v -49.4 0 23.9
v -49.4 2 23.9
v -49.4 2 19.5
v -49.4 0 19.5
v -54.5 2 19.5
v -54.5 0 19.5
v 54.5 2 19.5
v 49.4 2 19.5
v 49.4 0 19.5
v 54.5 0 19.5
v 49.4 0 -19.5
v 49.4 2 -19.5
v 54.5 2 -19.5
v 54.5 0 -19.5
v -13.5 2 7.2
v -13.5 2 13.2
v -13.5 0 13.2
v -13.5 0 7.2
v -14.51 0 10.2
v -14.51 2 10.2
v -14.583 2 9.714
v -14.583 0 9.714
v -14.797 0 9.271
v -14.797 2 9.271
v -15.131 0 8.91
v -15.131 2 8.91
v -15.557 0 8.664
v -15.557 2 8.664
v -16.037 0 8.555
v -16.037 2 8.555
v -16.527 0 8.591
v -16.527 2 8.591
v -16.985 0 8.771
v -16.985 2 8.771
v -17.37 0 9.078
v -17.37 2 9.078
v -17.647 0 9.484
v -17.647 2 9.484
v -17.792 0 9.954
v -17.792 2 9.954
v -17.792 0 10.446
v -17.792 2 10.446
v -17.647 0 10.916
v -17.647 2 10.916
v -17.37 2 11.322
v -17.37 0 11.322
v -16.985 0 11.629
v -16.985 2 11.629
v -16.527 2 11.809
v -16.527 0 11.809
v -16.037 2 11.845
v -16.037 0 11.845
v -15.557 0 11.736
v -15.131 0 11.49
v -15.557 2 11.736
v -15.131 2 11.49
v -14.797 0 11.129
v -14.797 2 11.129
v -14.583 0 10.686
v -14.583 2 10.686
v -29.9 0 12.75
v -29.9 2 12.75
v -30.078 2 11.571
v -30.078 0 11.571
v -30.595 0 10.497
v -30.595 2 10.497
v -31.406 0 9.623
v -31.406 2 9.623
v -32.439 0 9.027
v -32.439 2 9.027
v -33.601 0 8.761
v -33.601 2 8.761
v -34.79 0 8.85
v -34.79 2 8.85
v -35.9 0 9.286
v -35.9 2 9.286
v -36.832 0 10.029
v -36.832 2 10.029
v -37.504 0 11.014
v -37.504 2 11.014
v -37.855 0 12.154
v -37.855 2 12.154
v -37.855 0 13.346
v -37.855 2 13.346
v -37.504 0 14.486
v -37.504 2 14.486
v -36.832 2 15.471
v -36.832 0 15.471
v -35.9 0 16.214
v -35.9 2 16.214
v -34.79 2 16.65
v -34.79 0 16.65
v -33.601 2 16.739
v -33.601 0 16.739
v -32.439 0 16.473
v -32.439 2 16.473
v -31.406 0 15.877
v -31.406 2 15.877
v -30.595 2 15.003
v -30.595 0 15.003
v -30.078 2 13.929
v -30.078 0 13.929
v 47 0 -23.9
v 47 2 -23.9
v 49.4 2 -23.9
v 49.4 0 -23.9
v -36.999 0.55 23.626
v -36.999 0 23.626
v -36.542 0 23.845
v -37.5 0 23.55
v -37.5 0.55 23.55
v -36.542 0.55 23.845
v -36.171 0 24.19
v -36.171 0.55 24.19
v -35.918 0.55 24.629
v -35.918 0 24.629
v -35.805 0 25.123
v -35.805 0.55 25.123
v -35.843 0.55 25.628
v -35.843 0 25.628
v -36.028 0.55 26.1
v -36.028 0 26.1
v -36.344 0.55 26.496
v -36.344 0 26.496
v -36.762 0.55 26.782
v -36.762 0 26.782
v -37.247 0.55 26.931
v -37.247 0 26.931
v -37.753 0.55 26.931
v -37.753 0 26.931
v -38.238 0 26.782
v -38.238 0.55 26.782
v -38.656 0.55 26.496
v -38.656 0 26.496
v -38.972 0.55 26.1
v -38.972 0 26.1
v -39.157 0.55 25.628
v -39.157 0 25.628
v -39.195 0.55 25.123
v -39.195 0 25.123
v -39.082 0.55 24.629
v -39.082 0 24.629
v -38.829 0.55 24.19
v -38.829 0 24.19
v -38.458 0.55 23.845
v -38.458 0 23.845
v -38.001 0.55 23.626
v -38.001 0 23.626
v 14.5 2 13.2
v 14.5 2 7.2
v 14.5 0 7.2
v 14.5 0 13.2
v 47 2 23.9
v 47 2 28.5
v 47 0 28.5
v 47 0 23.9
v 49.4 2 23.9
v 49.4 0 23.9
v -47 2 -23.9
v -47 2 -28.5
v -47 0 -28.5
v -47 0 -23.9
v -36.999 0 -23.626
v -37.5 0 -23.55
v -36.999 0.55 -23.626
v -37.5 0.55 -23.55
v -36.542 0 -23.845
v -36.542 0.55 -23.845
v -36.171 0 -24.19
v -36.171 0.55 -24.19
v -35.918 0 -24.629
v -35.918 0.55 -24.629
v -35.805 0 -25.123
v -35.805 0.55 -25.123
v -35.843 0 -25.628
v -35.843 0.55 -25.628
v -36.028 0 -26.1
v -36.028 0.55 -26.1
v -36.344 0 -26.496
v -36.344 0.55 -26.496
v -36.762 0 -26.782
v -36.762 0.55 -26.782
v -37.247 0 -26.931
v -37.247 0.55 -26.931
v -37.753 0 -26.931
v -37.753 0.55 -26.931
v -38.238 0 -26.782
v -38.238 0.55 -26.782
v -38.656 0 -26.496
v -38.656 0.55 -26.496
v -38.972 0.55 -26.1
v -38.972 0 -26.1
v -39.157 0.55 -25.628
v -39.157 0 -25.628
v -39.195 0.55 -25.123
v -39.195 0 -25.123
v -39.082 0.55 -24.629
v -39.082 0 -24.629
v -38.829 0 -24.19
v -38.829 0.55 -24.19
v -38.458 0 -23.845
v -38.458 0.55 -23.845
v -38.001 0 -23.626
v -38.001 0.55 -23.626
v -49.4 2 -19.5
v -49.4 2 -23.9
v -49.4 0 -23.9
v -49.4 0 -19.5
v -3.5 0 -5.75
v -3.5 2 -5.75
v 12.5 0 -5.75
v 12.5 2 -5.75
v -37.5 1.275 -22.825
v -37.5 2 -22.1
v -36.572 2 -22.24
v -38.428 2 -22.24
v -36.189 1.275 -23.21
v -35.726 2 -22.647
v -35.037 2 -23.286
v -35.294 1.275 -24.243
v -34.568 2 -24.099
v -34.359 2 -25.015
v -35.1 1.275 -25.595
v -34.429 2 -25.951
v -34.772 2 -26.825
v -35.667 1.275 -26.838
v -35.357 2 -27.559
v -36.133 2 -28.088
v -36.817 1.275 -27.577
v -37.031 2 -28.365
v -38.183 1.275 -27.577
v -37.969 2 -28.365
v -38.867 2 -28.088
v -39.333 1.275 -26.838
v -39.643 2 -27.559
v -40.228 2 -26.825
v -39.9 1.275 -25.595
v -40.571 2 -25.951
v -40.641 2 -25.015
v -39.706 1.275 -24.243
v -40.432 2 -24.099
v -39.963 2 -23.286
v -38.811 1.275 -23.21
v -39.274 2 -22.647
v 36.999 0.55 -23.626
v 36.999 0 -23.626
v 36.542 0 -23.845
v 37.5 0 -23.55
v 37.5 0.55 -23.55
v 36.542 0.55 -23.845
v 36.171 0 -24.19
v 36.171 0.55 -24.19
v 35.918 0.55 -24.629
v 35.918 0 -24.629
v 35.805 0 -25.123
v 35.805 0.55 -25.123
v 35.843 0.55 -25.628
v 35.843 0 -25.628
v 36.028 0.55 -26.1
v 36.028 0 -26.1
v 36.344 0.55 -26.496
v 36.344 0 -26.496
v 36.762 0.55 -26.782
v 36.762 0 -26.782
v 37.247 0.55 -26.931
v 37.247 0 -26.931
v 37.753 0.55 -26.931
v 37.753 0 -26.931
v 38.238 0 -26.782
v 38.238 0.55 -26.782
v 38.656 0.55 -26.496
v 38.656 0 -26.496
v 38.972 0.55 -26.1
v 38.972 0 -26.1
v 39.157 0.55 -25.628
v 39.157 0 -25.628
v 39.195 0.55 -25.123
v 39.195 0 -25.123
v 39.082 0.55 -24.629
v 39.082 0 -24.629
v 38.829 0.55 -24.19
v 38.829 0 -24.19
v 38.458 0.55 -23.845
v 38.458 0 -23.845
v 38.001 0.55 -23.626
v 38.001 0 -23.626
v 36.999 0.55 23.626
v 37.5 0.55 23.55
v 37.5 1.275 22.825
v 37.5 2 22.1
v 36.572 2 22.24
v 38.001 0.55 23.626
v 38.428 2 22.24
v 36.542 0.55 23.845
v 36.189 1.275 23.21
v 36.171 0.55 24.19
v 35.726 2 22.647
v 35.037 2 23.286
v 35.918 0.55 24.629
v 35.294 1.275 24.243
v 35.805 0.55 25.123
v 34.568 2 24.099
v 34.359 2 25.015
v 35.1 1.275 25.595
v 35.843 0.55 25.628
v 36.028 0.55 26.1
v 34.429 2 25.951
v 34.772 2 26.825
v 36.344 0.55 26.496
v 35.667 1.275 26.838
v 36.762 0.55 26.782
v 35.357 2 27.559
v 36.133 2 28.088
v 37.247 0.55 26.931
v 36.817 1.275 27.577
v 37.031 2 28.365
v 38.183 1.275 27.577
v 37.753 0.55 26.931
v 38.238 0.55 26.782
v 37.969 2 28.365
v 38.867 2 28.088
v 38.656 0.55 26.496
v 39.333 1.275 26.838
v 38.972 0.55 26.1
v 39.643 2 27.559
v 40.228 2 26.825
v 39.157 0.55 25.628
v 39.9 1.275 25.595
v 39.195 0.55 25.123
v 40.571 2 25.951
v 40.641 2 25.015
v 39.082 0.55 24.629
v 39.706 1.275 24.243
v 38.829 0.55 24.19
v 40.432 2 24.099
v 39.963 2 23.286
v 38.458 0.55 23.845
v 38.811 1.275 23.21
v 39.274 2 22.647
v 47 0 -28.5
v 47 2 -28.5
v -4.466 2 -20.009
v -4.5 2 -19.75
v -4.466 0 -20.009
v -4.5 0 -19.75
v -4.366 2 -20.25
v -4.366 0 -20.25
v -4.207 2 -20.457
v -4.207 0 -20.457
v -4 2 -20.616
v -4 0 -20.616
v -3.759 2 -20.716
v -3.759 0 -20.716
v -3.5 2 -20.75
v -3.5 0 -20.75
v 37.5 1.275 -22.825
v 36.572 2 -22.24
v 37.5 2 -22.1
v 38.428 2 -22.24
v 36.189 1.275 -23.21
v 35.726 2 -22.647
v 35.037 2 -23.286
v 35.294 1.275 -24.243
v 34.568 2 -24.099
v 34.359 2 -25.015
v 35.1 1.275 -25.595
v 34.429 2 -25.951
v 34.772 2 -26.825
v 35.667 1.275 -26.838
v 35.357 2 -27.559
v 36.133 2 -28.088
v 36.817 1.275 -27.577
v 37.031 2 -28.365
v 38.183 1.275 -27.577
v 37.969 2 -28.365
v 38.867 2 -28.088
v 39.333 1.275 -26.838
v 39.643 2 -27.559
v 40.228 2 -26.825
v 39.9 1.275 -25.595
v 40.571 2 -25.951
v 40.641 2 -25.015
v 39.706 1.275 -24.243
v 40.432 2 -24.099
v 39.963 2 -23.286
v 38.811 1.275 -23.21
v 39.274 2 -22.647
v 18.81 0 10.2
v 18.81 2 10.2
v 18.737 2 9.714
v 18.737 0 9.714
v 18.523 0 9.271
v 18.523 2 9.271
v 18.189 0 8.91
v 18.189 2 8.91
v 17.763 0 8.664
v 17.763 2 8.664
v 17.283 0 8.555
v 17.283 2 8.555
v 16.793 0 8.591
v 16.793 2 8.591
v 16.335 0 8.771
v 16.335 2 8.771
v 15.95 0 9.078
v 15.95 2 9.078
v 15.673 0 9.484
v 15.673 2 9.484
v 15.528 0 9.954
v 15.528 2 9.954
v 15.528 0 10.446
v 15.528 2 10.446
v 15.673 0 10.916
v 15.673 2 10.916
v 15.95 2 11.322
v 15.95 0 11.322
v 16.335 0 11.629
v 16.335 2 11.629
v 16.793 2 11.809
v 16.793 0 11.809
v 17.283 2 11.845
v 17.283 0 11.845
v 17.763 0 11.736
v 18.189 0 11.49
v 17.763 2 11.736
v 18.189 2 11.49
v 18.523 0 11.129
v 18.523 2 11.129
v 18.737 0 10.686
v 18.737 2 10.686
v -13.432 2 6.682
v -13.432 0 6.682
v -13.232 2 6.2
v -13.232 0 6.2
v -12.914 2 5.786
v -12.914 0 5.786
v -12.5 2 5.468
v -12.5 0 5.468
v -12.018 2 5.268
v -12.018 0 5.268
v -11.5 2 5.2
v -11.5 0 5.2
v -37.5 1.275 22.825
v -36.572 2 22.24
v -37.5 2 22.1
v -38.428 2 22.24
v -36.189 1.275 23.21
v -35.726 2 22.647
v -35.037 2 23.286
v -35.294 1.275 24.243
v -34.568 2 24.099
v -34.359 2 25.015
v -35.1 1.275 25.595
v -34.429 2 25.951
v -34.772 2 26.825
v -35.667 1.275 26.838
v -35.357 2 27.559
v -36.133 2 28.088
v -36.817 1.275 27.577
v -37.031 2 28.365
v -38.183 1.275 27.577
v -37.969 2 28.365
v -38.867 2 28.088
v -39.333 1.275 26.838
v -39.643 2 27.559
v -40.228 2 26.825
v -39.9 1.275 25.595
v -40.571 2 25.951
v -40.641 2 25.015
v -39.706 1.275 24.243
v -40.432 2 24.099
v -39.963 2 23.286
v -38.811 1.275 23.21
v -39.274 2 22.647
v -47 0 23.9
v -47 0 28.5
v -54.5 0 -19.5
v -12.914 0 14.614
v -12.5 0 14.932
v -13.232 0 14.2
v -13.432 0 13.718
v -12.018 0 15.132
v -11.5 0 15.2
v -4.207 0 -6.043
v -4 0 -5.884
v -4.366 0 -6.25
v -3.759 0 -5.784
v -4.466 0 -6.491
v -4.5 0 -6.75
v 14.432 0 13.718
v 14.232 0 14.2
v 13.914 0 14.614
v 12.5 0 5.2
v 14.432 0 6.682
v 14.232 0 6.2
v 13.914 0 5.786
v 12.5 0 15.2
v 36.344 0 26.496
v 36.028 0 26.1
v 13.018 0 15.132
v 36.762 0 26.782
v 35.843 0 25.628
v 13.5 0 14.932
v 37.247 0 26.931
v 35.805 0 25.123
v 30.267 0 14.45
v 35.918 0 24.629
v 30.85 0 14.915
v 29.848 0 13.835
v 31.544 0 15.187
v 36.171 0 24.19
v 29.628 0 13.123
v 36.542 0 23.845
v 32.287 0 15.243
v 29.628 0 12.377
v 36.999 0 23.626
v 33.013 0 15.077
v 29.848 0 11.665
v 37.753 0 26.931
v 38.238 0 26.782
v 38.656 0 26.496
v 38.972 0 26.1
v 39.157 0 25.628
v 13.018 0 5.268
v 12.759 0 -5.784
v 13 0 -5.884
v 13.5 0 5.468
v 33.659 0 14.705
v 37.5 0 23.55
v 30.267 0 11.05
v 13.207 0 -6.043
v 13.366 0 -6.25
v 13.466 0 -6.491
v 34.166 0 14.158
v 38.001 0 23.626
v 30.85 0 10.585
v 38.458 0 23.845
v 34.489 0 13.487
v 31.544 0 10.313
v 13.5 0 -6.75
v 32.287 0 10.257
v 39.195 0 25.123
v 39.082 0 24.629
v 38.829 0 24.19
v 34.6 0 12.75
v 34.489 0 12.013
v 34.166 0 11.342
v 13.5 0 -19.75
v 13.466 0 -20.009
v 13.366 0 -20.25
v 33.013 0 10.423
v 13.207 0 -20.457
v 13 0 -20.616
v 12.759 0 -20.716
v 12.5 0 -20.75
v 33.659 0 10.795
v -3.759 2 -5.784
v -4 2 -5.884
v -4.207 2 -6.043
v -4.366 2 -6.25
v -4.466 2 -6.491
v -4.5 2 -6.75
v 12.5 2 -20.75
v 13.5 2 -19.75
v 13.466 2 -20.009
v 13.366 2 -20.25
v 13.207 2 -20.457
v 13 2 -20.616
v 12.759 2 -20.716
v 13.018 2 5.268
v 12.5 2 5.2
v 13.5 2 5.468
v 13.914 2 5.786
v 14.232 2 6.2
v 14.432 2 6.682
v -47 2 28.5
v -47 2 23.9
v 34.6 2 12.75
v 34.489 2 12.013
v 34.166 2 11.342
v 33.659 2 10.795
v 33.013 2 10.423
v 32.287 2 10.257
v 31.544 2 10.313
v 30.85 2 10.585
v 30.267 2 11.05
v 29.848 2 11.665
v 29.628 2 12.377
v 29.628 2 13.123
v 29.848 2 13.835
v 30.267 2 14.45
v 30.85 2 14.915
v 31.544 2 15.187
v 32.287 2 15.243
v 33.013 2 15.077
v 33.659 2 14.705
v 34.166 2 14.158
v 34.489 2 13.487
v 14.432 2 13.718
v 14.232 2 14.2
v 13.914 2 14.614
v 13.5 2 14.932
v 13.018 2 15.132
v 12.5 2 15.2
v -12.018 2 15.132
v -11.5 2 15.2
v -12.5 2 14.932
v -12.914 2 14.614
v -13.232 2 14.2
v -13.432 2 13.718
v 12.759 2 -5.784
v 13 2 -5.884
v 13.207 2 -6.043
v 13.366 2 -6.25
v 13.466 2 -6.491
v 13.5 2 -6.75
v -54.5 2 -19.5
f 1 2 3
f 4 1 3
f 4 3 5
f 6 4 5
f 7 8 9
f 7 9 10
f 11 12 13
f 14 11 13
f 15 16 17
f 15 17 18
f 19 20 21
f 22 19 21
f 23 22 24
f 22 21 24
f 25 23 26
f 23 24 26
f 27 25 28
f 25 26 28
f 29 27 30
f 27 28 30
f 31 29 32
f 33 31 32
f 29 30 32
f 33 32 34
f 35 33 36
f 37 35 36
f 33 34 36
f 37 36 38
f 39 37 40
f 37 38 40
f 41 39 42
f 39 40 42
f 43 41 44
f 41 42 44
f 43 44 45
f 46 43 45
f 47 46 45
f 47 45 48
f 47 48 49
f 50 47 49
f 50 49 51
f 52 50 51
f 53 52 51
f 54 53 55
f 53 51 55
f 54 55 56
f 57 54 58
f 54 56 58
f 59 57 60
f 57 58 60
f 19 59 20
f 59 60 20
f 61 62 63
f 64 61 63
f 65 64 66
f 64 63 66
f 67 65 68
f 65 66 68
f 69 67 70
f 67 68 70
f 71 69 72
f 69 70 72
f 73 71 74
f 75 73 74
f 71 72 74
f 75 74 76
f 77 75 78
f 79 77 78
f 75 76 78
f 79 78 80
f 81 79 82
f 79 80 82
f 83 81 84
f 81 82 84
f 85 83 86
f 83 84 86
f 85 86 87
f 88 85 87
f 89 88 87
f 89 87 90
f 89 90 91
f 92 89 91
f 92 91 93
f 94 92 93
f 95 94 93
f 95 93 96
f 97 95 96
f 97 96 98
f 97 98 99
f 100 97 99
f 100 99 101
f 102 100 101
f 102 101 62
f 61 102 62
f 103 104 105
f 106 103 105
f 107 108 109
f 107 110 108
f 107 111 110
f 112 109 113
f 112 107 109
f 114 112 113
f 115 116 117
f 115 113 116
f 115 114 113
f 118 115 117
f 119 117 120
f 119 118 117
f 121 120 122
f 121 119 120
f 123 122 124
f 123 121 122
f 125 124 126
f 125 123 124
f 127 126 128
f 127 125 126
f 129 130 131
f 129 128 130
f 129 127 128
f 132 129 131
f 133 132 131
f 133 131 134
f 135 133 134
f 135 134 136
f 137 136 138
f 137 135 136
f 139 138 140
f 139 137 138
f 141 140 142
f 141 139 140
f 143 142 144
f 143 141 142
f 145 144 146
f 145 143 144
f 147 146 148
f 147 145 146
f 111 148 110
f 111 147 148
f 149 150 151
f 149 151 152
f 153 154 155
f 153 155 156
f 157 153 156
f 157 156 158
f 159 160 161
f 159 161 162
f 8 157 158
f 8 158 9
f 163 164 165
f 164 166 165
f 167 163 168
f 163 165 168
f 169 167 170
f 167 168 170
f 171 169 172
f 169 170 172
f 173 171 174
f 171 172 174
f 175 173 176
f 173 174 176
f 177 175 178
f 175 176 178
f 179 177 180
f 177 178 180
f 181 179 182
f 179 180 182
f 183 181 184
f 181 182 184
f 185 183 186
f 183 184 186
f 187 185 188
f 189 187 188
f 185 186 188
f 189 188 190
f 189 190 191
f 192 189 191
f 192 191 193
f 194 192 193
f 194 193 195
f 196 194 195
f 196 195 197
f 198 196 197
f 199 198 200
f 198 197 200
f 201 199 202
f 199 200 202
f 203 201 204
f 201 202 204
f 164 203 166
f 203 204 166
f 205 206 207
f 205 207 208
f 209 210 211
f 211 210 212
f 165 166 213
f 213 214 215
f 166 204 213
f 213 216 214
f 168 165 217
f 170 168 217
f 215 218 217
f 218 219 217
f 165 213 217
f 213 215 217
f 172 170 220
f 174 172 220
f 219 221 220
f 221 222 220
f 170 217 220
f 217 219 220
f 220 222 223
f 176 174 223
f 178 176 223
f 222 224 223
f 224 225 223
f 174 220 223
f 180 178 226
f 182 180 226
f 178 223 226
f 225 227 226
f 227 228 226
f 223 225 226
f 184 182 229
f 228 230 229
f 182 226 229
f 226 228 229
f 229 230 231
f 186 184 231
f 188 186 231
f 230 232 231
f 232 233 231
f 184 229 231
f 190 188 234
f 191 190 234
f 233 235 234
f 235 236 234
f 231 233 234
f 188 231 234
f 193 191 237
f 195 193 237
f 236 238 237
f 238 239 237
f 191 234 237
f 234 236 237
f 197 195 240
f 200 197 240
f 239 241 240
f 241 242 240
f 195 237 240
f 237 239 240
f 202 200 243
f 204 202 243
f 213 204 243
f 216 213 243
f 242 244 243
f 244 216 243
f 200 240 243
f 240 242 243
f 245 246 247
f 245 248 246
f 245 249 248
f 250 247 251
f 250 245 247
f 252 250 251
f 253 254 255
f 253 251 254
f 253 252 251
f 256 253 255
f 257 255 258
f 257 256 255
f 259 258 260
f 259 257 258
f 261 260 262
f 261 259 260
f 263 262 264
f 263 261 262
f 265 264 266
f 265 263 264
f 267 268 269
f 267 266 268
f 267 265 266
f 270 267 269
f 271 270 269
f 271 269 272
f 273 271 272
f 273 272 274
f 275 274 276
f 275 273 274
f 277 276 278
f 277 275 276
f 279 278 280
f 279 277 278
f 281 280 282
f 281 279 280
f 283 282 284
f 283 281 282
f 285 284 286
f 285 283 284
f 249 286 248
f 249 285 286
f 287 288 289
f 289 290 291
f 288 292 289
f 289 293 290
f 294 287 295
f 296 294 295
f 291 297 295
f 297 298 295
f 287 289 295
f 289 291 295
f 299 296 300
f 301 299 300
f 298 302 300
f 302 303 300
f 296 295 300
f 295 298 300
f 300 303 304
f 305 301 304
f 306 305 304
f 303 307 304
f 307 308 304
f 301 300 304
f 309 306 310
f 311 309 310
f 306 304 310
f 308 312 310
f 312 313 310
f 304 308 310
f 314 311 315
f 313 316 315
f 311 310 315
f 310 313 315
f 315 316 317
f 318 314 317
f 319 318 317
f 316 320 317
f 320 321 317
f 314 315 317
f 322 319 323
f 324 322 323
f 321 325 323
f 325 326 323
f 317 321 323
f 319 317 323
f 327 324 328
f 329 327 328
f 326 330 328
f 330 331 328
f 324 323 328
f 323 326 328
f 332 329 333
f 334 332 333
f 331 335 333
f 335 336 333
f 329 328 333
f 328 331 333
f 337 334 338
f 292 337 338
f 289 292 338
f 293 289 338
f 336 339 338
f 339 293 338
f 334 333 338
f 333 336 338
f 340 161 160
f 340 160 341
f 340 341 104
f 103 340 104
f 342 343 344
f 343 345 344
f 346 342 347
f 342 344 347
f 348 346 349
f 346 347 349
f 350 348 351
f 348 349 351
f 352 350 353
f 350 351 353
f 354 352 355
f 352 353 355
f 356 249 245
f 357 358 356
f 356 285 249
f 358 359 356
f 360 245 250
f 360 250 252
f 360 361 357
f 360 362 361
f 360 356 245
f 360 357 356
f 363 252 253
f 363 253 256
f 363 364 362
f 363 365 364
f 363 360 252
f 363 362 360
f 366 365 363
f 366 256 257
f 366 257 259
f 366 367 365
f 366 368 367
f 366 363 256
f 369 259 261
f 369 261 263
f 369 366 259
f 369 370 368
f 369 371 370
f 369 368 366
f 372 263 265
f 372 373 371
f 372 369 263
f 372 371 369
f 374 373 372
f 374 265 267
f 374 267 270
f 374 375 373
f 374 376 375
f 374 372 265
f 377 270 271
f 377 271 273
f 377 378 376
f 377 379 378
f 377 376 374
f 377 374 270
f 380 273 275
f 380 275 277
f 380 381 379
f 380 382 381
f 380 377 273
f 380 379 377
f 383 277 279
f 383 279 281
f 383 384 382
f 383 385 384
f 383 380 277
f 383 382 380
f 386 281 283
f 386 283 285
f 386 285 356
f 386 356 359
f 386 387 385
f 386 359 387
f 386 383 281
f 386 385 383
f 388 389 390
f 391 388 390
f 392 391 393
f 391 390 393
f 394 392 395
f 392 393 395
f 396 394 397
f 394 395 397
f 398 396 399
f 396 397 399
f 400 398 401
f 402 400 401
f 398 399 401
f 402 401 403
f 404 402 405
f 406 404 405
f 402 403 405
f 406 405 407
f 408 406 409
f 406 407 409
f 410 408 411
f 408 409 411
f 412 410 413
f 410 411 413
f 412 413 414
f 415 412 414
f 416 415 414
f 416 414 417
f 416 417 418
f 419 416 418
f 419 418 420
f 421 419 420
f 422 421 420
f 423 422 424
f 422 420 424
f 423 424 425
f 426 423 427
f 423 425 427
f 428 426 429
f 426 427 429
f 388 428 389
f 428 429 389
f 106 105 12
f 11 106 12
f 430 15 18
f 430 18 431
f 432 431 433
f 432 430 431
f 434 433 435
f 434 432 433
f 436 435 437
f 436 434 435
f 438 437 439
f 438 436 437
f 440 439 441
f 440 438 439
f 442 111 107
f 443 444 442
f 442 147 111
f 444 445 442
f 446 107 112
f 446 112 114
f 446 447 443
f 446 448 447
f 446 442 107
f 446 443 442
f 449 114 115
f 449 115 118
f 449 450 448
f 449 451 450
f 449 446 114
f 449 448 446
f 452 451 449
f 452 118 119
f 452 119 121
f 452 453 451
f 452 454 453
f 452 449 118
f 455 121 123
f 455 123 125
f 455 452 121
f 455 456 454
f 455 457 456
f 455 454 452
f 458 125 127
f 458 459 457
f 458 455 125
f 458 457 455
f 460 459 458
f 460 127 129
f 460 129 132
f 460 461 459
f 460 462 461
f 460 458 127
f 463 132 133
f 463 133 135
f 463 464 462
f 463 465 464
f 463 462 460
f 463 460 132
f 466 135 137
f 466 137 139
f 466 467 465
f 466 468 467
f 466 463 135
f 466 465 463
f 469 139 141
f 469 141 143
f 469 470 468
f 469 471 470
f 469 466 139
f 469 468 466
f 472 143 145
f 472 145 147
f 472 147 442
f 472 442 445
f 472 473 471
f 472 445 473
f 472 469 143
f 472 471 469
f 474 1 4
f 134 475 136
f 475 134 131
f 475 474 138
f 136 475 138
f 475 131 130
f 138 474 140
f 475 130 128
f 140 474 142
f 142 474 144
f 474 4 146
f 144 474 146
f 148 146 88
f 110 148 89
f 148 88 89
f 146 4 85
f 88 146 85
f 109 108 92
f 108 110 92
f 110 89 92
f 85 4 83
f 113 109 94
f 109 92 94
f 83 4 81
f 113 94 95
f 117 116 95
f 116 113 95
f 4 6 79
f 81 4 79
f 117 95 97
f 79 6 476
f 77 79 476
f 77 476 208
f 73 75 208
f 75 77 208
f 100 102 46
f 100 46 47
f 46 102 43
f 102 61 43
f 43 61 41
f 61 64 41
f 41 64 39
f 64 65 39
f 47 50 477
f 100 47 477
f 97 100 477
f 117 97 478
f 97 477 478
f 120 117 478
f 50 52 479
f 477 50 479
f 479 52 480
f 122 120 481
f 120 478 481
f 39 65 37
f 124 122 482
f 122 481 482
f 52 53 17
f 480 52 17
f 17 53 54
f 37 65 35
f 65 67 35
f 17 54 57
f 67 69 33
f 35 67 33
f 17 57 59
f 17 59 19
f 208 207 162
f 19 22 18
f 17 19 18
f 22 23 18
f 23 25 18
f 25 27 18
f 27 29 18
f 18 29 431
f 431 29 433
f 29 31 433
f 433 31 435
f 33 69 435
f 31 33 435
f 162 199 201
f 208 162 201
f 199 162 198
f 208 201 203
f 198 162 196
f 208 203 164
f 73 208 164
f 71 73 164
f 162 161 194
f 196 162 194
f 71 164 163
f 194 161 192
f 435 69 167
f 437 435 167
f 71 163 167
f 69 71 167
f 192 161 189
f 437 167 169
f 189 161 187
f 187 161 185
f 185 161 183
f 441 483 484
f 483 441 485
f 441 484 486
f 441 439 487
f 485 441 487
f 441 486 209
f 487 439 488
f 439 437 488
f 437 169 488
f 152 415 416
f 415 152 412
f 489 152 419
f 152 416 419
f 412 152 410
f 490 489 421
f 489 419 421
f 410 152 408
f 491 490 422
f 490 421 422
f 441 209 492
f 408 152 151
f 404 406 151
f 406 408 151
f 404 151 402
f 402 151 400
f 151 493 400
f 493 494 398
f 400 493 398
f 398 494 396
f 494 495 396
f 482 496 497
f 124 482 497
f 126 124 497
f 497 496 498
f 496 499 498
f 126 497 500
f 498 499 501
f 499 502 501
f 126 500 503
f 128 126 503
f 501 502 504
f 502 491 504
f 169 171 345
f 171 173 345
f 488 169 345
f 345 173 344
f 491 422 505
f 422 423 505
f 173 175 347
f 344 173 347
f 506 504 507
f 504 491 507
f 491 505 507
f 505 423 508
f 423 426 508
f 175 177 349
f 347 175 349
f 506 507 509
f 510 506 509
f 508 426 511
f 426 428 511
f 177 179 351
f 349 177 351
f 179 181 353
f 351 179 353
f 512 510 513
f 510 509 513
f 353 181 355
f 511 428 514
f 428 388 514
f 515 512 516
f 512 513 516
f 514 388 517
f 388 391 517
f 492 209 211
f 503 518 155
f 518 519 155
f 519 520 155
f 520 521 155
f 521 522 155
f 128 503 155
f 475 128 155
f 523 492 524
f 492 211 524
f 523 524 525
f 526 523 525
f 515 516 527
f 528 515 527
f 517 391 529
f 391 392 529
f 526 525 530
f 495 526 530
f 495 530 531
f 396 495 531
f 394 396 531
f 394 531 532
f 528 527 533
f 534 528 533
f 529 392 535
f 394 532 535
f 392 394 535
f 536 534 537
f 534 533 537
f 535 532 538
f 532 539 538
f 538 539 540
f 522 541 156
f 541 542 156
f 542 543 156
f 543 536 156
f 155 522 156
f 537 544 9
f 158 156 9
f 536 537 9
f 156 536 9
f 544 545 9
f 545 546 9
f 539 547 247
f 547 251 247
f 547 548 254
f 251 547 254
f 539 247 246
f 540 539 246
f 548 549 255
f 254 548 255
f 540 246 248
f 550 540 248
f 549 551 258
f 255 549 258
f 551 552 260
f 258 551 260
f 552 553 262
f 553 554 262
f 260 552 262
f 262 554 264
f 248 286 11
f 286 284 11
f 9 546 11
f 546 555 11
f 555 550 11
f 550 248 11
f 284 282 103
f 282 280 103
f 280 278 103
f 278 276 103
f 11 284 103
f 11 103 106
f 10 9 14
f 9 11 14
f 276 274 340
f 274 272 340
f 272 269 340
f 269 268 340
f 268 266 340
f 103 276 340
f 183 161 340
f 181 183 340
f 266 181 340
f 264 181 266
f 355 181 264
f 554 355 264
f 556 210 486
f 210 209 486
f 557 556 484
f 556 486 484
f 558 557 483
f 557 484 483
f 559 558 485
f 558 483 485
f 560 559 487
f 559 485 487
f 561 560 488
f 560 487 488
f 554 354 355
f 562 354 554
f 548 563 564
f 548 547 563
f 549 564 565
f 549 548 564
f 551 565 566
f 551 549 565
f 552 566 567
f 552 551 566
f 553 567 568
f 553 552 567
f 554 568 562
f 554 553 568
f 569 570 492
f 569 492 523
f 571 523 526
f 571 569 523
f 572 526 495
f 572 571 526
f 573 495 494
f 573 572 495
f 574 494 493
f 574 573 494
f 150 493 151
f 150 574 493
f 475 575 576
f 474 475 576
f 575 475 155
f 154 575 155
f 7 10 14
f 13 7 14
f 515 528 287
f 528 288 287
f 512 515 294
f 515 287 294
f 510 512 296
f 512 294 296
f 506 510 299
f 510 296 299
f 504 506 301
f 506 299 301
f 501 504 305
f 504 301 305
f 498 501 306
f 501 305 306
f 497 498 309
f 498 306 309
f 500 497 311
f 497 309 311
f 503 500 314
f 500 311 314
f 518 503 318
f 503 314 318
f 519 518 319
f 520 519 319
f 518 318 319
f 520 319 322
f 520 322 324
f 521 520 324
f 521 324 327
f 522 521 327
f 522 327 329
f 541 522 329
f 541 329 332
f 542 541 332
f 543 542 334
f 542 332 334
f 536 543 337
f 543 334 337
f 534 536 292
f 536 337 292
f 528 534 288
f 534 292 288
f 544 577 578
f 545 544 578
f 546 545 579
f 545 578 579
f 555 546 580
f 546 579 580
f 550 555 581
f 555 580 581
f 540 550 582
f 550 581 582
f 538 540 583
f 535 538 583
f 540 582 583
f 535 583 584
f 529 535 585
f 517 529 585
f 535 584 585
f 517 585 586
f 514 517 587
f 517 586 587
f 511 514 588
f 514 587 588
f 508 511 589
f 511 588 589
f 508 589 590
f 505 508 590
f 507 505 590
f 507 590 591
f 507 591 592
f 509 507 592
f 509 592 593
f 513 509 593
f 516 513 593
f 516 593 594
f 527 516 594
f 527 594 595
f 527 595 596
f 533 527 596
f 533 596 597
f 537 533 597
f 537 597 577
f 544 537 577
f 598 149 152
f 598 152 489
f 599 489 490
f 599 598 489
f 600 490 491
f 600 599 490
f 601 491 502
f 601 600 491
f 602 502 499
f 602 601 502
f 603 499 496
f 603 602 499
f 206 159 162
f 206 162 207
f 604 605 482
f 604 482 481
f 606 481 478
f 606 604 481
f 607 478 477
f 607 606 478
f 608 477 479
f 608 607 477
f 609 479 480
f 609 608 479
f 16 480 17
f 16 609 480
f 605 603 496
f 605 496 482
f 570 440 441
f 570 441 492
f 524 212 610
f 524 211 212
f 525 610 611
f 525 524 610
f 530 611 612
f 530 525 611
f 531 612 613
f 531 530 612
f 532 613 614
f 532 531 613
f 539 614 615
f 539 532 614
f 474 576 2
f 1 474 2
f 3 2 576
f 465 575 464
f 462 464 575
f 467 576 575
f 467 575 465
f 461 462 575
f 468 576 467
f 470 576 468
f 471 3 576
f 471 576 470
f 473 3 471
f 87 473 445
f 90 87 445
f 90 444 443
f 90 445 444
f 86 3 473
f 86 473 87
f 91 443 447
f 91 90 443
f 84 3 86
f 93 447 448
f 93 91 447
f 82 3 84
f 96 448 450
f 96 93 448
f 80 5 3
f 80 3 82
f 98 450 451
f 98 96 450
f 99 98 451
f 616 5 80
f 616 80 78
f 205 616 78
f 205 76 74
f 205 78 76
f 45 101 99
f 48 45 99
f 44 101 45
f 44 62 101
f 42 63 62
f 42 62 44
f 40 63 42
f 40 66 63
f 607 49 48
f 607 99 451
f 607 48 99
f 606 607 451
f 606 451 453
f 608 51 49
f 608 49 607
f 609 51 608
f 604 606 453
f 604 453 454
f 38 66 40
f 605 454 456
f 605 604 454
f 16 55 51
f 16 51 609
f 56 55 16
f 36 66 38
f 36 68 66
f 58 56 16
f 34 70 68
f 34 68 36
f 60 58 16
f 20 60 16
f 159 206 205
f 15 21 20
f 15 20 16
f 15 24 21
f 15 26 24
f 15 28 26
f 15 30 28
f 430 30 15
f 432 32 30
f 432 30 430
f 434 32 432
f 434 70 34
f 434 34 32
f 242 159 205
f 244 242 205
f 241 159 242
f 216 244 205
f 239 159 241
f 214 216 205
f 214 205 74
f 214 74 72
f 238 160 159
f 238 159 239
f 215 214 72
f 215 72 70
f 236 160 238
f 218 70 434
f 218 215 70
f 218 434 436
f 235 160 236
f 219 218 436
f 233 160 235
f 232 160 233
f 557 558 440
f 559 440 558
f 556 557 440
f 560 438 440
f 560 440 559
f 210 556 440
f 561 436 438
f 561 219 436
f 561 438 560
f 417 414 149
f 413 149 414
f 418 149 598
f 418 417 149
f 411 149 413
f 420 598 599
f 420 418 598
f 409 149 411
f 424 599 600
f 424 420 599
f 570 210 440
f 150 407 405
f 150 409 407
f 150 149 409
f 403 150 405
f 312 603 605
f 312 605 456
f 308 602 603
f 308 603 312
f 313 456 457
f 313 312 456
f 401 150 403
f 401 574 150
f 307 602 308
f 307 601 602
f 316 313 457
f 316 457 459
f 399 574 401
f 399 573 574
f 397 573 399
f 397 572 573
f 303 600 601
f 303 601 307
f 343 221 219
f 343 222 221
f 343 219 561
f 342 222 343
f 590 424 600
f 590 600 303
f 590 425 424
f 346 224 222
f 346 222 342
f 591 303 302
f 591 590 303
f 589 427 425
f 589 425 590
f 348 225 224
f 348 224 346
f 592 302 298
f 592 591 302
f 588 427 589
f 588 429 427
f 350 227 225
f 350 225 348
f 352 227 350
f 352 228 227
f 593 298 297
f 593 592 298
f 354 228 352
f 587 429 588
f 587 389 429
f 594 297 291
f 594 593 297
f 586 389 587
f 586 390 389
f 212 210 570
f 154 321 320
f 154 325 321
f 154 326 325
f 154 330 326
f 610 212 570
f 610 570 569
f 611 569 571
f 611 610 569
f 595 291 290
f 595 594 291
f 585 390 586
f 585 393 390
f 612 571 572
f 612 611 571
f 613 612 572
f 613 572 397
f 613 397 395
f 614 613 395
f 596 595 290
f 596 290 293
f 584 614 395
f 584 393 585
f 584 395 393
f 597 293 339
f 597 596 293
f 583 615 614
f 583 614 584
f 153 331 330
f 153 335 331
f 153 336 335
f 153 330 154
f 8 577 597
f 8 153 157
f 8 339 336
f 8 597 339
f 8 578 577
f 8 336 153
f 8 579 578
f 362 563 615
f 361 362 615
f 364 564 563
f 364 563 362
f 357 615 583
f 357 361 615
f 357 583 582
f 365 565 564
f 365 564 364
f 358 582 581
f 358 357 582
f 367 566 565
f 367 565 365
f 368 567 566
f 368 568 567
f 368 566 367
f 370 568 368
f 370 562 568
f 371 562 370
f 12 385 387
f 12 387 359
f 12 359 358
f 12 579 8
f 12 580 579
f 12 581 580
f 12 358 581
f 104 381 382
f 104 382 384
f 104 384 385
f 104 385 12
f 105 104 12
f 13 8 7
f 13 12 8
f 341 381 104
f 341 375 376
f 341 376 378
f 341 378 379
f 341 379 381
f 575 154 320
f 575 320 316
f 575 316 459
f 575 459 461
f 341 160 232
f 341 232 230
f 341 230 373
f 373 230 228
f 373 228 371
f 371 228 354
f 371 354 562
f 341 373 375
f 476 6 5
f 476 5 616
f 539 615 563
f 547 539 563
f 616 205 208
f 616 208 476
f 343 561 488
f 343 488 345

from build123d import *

# Parameters (mm, degrees)
SKETCH_1_W            = 109
SKETCH_1_H            = 57
EXTRUDE_1_DEPTH       = 2
CUT_EXTRUDE_1_DEPTH   = 3
MIRROR_2_COPY_1_DEPTH = 3
SKETCH_3_R            = 4
SKETCH_3_R_2          = 2.5
CUT_EXTRUDE_2_DEPTH   = 3
SKETCH_4_R            = 1.65
CUT_EXTRUDE_3_DEPTH   = 2
SKETCH_5_W            = 18
SKETCH_5_H            = 15
CUT_EXTRUDE_4_DEPTH   = 3
FILLET_1_R            = 1


with BuildPart() as part:
    # Эскиз1 → Бобышка-Вытянуть1 (new body)
    with BuildSketch(Plane(origin=(0, 0, 0), x_dir=(1, 0, 0), z_dir=(0, 1, 0))):
        Rectangle(SKETCH_1_W, SKETCH_1_H)
    extrude(amount=EXTRUDE_1_DEPTH)

    # Эскиз2 → Вырез-Вытянуть1 (cut, through all)
    with BuildSketch(Plane(origin=(0, 2, 0), x_dir=(1, 0, 0), z_dir=(0, 1, 0))):
        Polygon((49.4, 19.5), (54.5, 19.5), (54.5, 28.5), (47, 28.5), (47, 23.9), (49.4, 23.9), align=None)
    cut_extrude_1 = extrude(amount=-CUT_EXTRUDE_1_DEPTH, mode=Mode.SUBTRACT)

    # Зеркальное отражение1: Вырез-Вытянуть1 across plane
    add(cut_extrude_1.mirror(Plane(origin=(0, 0, 0), x_dir=(0, 0, 1), z_dir=(1, 0, 0))), mode=Mode.SUBTRACT)

    # Зеркальное отражение2: Вырез-Вытянуть1 across plane
    add(cut_extrude_1.mirror(Plane.XY), mode=Mode.SUBTRACT)

    # Зеркальное отражение2 copy 1 sketch → Зеркальное отражение2 copy 1 (cut, through all)
    with BuildSketch(Plane(origin=(0, 2, 0), x_dir=(-1, 0, 0), z_dir=(0, 1, 0))):
        Polygon((49.4, 19.5), (54.5, 19.5), (54.5, 28.5), (47, 28.5), (47, 23.9), (49.4, 23.9), align=None)
    extrude(amount=-MIRROR_2_COPY_1_DEPTH, mode=Mode.SUBTRACT)

    # Эскиз3 → Вырез-Вытянуть2 (cut, through all)
    with BuildSketch(Plane(origin=(0, 2, 0), x_dir=(1, 0, 0), z_dir=(0, 1, 0))):
        with Locations((-33.9, -12.75)):
            Circle(SKETCH_3_R)
        with Locations((32.1, -12.75)):
            Circle(SKETCH_3_R_2)
    extrude(amount=-CUT_EXTRUDE_2_DEPTH, mode=Mode.SUBTRACT)

    # Эскиз4 → Вырез-Вытянуть3 (cut)
    with BuildSketch(Plane(origin=(0, 2, 0), x_dir=(1, 0, 0), z_dir=(0, 1, 0))):
        with Locations((17.16, -10.2)):
            Circle(SKETCH_4_R)
        with Locations((-16.16, -10.2)):
            Circle(SKETCH_4_R)
        with BuildLine():
            Line((-11.5, -5.2), (12.5, -5.2))
            ThreePointArc((12.5, -5.2), (13.914213562, -5.785786438), (14.5, -7.2))
            Line((14.5, -7.2), (14.5, -13.2))
            ThreePointArc((14.5, -13.2), (13.914213562, -14.614213562), (12.5, -15.2))
            Line((12.5, -15.2), (-11.5, -15.2))
            ThreePointArc((-11.5, -15.2), (-12.914213562, -14.614213562), (-13.5, -13.2))
            Line((-13.5, -13.2), (-13.5, -7.2))
            ThreePointArc((-13.5, -7.2), (-12.914213562, -5.785786438), (-11.5, -5.2))
        make_face()
    extrude(amount=-CUT_EXTRUDE_3_DEPTH, mode=Mode.SUBTRACT)

    # Эскиз5 → Вырез-Вытянуть4 (cut, through all)
    with BuildSketch(Plane(origin=(0, 2, 0), x_dir=(1, 0, 0), z_dir=(0, 1, 0))):
        with Locations((4.5, 13.25)):
            Rectangle(SKETCH_5_W, SKETCH_5_H)
    extrude(amount=-CUT_EXTRUDE_4_DEPTH, mode=Mode.SUBTRACT)

    # Эскиз6 → Зенковка для винта с полупотайной головкой M31 (revolve, cut)
    with BuildSketch(Plane(origin=(37.5, 2, -25.25), x_dir=(0, 0, 1), z_dir=(1, 0, 0))):
        Polygon((0, 0), (0, 2.001), (1.7, 2.001), (1.7, 1.45), (3.15, 0), align=None)
    hole_wizard_m31 = revolve(axis=Axis((37.5, 8.35, -25.25), (0, -1, 0)), mode=Mode.SUBTRACT)

    # Зеркальное отражение3: Зенковка для винта с полупотайной головкой M31 across plane
    add(hole_wizard_m31.mirror(Plane.XY), mode=Mode.SUBTRACT)

    # Зеркальное отражение4: Зенковка для винта с полупотайной головкой M31 across plane
    add(hole_wizard_m31.mirror(Plane(origin=(0, 0, 0), x_dir=(0, 0, 1), z_dir=(1, 0, 0))), mode=Mode.SUBTRACT)

    # Зеркальное отражение4 copy 1 sketch → Зеркальное отражение4 copy 1 (revolve, cut)
    with BuildSketch(Plane(origin=(-37.5, 2, 25.25), x_dir=(0, 0, -1), z_dir=(-1, 0, 0))):
        Polygon((0, 0), (0, 2.001), (1.7, 2.001), (1.7, 1.45), (3.15, 0), align=None)
    revolve(axis=Axis((-37.5, 8.35, 25.25), (0, -1, 0)), mode=Mode.SUBTRACT)

    # Скругление1
    fillet_1_edges = [part.edges().sort_by_distance(p)[0] for p in [
        (13.5, 1, -20.75),
        (13.5, 1, -5.75),
        (-4.5, 1, -5.75),
        (-4.5, 1, -20.75),
    ]]
    fillet(fillet_1_edges, radius=FILLET_1_R)


solid = part.part
